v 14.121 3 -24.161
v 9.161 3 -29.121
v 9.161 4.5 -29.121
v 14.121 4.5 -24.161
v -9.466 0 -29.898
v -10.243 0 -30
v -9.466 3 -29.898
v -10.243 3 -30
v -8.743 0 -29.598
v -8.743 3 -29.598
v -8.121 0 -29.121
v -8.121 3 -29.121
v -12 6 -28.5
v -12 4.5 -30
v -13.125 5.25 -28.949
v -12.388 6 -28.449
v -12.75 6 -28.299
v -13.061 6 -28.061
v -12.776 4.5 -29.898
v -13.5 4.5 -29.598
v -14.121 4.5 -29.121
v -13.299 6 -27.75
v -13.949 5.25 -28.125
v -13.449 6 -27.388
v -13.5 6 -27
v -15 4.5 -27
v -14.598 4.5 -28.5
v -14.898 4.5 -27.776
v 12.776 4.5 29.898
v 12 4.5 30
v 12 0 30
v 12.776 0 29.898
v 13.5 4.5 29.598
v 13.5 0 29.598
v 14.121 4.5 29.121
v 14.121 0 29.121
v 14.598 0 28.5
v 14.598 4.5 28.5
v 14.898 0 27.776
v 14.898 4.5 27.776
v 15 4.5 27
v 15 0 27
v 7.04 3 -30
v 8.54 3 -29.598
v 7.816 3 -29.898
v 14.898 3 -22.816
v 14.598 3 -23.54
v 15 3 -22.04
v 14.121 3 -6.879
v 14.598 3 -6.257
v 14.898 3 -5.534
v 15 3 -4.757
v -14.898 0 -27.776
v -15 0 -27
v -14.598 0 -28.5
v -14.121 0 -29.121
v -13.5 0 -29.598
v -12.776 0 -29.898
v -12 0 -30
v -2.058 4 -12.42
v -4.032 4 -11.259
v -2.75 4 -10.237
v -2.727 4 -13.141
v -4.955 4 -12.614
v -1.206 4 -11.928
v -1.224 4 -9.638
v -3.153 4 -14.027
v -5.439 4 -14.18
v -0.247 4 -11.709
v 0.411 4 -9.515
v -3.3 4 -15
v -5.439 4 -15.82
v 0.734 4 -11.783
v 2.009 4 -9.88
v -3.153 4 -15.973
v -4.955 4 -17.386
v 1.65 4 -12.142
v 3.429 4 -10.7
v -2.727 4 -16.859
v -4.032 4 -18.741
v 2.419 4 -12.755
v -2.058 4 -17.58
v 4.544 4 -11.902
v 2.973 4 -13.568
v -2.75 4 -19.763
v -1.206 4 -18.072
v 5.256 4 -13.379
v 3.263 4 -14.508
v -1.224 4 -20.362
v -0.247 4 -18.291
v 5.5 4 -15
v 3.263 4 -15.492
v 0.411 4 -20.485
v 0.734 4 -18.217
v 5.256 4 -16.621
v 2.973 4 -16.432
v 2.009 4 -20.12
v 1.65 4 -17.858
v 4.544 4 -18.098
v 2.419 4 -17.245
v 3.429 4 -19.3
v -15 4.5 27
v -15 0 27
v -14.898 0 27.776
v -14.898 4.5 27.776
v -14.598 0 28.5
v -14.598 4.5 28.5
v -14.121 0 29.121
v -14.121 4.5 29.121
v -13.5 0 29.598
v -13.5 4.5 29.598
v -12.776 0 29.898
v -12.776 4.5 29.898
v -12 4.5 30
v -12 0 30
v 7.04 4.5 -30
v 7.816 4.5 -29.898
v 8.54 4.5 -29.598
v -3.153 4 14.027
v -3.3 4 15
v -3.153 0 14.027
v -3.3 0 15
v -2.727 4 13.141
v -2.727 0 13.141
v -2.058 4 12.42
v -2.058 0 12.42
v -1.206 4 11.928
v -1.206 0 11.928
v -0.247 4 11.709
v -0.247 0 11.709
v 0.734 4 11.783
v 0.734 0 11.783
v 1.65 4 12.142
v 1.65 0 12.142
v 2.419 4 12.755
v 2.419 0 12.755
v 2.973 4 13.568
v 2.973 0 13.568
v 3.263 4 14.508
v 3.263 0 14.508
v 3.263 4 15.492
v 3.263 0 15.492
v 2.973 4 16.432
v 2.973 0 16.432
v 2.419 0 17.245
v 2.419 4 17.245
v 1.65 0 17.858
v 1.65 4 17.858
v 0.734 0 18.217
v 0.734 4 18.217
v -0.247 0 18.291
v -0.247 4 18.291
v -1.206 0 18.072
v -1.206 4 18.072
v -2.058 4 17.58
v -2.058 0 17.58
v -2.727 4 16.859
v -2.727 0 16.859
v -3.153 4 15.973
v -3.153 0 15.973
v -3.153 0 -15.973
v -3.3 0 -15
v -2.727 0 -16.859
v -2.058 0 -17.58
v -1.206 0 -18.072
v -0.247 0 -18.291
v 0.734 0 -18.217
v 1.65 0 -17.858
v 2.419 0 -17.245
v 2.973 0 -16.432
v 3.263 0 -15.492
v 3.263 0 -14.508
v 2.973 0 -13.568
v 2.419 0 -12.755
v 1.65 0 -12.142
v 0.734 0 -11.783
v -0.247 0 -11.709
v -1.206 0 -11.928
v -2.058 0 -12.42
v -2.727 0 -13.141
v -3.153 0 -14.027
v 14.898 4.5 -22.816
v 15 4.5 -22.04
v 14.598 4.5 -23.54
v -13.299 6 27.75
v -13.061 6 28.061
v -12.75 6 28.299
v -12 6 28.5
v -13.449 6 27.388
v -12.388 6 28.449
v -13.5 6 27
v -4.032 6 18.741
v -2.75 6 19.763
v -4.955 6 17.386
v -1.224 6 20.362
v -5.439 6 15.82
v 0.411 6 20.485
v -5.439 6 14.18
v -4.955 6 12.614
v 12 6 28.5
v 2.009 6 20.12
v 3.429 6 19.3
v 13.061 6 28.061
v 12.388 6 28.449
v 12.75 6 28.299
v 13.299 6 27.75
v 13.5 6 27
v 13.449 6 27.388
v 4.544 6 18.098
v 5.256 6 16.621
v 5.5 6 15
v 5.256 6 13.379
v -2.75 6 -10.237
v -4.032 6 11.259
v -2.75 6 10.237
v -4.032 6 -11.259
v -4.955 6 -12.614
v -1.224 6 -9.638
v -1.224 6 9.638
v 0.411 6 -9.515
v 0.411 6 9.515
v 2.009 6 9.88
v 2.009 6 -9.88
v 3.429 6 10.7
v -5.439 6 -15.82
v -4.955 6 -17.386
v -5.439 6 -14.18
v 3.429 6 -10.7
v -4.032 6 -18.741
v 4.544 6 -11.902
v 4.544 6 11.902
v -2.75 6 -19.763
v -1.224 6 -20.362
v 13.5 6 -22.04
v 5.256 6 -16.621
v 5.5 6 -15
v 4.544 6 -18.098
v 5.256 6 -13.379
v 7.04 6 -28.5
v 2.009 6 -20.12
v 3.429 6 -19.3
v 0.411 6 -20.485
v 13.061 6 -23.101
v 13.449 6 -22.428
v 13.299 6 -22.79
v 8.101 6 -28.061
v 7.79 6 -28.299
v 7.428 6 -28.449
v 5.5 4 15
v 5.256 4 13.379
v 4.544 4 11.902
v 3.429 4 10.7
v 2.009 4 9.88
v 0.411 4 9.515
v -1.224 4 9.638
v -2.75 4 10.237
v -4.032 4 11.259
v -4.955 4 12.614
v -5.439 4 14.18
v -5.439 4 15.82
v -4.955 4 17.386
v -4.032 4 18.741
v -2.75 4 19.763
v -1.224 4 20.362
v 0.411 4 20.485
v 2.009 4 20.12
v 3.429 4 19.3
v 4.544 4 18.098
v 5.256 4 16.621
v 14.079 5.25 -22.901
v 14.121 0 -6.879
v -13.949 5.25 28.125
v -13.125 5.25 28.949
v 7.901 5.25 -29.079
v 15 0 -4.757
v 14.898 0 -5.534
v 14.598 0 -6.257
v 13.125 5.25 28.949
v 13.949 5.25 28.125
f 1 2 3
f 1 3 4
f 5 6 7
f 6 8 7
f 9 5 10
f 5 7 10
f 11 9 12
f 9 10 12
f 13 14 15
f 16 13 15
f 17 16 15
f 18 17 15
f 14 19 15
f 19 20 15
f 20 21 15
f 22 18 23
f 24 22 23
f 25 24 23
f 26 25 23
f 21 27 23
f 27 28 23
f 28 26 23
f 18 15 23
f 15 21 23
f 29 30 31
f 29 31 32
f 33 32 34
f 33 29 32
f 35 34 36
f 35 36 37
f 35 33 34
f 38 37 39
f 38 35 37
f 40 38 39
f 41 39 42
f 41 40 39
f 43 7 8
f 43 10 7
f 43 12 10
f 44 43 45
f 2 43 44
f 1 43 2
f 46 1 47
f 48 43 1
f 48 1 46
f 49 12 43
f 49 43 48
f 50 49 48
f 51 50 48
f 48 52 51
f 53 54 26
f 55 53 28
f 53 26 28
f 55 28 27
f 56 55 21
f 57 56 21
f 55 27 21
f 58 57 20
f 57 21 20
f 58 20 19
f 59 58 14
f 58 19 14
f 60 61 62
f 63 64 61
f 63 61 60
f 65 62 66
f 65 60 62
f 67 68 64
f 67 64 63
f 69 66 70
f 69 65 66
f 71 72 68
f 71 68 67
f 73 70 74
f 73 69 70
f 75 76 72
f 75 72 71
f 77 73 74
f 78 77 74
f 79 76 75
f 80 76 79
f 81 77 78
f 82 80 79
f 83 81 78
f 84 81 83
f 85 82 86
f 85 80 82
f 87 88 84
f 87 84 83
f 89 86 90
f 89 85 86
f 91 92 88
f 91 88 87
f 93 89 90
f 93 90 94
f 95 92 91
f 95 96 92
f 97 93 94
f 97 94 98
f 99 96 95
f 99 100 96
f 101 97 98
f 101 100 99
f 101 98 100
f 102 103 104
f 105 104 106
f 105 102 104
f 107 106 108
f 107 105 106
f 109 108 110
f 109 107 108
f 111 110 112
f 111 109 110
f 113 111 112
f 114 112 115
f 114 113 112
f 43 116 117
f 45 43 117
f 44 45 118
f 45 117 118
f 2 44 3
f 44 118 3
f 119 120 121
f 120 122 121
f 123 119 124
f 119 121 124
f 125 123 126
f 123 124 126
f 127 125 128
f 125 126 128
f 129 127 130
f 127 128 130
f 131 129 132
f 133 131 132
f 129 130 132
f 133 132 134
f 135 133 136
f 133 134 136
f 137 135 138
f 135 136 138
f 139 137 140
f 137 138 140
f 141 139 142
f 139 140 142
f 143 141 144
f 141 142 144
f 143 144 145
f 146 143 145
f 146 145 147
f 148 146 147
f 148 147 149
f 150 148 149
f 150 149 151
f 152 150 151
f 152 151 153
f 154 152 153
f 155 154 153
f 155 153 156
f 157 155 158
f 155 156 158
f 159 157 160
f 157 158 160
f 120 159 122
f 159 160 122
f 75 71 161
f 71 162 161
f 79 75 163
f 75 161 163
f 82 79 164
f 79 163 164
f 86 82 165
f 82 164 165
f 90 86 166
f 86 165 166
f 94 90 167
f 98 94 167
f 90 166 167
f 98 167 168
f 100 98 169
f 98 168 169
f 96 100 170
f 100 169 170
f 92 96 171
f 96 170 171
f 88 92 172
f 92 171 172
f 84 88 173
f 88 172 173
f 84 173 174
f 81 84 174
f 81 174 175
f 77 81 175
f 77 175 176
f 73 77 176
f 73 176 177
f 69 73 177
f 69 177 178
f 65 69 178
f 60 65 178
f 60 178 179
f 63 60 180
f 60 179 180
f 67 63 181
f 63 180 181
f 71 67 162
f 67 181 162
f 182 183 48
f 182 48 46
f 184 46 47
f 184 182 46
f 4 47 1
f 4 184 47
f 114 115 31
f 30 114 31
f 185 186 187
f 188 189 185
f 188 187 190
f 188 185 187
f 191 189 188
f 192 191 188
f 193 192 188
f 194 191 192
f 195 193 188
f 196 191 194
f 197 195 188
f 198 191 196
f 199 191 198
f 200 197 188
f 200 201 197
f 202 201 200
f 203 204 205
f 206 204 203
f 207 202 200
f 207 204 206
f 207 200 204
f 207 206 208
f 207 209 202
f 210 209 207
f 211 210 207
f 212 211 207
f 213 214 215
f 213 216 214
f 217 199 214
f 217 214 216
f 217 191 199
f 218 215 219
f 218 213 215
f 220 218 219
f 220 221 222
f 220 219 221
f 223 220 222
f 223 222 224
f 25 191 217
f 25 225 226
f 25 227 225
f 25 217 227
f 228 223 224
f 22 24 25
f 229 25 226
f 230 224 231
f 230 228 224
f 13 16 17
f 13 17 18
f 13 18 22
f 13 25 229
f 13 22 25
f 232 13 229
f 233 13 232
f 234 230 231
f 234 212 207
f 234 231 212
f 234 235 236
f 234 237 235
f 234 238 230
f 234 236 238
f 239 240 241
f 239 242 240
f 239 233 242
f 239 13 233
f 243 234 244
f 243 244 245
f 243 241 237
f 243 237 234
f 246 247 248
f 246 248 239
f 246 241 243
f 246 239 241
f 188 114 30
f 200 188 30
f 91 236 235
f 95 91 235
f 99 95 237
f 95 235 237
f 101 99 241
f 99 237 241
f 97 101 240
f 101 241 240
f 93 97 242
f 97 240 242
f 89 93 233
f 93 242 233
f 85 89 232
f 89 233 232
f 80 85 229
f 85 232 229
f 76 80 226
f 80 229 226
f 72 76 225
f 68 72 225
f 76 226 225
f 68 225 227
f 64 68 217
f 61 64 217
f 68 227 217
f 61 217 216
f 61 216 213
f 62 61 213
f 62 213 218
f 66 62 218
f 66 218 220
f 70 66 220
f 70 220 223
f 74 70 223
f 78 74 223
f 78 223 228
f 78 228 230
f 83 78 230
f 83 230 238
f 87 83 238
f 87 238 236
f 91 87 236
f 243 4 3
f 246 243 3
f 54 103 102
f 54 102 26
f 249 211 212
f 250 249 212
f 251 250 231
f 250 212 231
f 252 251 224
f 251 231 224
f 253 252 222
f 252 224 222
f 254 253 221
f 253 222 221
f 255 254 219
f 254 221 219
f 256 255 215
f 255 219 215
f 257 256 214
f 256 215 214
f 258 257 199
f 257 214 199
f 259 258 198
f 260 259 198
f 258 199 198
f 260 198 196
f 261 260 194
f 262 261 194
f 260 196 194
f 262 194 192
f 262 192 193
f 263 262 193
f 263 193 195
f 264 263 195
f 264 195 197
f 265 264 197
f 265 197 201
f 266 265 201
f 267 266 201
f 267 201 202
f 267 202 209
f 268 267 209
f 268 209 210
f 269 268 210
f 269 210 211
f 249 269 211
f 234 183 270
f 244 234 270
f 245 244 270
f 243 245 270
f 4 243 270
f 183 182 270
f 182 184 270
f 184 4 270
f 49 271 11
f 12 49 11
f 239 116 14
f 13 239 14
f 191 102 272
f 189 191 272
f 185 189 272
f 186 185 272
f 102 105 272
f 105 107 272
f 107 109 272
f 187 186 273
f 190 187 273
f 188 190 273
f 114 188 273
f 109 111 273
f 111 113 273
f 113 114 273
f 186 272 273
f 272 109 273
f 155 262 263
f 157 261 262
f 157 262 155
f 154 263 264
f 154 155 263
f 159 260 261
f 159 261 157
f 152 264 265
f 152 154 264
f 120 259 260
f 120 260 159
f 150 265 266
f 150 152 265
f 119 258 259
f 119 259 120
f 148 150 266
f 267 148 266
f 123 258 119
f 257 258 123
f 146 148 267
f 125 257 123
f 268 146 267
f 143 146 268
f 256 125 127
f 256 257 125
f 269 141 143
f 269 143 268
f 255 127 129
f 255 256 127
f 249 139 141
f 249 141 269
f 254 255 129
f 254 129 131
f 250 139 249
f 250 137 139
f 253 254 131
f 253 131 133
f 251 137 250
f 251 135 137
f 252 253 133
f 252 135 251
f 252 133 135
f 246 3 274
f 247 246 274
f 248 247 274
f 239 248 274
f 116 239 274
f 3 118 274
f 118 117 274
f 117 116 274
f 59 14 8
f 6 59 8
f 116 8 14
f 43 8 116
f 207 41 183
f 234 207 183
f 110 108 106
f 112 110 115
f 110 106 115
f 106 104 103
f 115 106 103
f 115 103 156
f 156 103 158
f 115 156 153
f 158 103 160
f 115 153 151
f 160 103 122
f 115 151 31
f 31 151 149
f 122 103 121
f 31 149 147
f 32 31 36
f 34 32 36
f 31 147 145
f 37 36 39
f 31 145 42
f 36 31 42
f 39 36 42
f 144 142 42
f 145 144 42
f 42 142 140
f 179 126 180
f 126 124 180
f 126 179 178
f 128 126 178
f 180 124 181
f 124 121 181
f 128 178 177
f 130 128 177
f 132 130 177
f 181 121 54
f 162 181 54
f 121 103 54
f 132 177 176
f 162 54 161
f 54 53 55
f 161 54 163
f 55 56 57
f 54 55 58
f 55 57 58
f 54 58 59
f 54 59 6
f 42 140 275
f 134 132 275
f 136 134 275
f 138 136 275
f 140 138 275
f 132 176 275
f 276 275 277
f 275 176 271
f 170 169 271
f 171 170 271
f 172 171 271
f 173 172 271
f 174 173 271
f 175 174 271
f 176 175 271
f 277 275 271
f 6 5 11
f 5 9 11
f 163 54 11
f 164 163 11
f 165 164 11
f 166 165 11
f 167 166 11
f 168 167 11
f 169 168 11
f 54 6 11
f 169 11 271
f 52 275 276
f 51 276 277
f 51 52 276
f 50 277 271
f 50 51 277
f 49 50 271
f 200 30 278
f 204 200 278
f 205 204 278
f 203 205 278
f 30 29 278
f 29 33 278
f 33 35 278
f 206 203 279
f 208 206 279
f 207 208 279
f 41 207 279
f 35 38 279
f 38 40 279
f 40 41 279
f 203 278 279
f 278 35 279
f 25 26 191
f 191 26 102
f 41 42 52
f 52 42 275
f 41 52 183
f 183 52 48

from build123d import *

# Parameters (mm, degrees)
SKETCH1_W                                           = 30
SKETCH1_H                                           = 60
BOSS_EXTRUDE1_DEPTH                                 = 6
CUT_EXTRUDE1_DEPTH                                  = 3
CUT_EXTRUDE2_DEPTH                                  = 34.674916481
FILLET1_R                                           = 3
CHAMFER1_SIZE                                       = 1.5
CBORE_FOR_M6_HEX_SOCKET_HEAD_CAP_SCREW1_D           = 6.6
CBORE_FOR_M6_HEX_SOCKET_HEAD_CAP_SCREW1_CBORE_D     = 11
CBORE_FOR_M6_HEX_SOCKET_HEAD_CAP_SCREW1_CBORE_DEPTH = 2


with BuildPart() as part:
    # Sketch1 → Boss-Extrude1 (new body)
    with BuildSketch(Plane(origin=(0, 0, 0), x_dir=(1, 0, 0), z_dir=(0, 1, 0))):
        Rectangle(SKETCH1_W, SKETCH1_H)
    extrude(amount=BOSS_EXTRUDE1_DEPTH)

    # Sketch2 → Cut-Extrude1 (cut)
    with BuildSketch(Plane.XZ):
        Polygon((15, -6), (-9, -30), (15, -30), align=None)
    extrude(amount=-CUT_EXTRUDE1_DEPTH, mode=Mode.SUBTRACT)

    # Sketch3 → Cut-Extrude2 (cut, through all)
    with BuildSketch(Plane.XZ.offset(-3)):
        Polygon((15, -23.282485579), (15, -30), (8.282485579, -30), align=None)
    extrude(amount=-CUT_EXTRUDE2_DEPTH, mode=Mode.SUBTRACT)

    # Fillet1
    fillet1_edges = [part.edges().sort_by_distance(p)[0] for p in [
        (15, 1.5, -6),
        (-9, 1.5, -30),
        (8.282485579, 4.5, -30),
        (15, 4.5, -23.282485579),
        (15, 3, 30),
        (-15, 3, 30),
        (-15, 3, -30),
    ]]
    fillet(fillet1_edges, radius=FILLET1_R)

    # Chamfer1
    chamfer1_edges = [part.edges().sort_by_distance(p)[0] for p in [
        (15, 6, 2.480077554),
        (-2.480077554, 6, -30),
        (0, 6, 30),
        (-15, 6, 0),
        (11.641242789, 6, -26.641242789),
        (14.121320344, 6, 29.121320344),
        (14.771638598, 6, -23.187895189),
        (8.187895189, 6, -29.771638598),
        (-14.121320344, 6, -29.121320344),
        (-14.121320344, 6, 29.121320344),
    ]]
    chamfer(chamfer1_edges, length=CHAMFER1_SIZE)

    # CBORE for M6 Hex Socket Head Cap Screw1 (through all)
    with Locations(Plane(origin=(0, 6, 0), x_dir=(1, 0, 0), z_dir=(0, 1, 0))):
        with Locations((0, -15), (0, 15)):
            CounterBoreHole(CBORE_FOR_M6_HEX_SOCKET_HEAD_CAP_SCREW1_D / 2, CBORE_FOR_M6_HEX_SOCKET_HEAD_CAP_SCREW1_CBORE_D / 2, CBORE_FOR_M6_HEX_SOCKET_HEAD_CAP_SCREW1_CBORE_DEPTH)


solid = part.part
